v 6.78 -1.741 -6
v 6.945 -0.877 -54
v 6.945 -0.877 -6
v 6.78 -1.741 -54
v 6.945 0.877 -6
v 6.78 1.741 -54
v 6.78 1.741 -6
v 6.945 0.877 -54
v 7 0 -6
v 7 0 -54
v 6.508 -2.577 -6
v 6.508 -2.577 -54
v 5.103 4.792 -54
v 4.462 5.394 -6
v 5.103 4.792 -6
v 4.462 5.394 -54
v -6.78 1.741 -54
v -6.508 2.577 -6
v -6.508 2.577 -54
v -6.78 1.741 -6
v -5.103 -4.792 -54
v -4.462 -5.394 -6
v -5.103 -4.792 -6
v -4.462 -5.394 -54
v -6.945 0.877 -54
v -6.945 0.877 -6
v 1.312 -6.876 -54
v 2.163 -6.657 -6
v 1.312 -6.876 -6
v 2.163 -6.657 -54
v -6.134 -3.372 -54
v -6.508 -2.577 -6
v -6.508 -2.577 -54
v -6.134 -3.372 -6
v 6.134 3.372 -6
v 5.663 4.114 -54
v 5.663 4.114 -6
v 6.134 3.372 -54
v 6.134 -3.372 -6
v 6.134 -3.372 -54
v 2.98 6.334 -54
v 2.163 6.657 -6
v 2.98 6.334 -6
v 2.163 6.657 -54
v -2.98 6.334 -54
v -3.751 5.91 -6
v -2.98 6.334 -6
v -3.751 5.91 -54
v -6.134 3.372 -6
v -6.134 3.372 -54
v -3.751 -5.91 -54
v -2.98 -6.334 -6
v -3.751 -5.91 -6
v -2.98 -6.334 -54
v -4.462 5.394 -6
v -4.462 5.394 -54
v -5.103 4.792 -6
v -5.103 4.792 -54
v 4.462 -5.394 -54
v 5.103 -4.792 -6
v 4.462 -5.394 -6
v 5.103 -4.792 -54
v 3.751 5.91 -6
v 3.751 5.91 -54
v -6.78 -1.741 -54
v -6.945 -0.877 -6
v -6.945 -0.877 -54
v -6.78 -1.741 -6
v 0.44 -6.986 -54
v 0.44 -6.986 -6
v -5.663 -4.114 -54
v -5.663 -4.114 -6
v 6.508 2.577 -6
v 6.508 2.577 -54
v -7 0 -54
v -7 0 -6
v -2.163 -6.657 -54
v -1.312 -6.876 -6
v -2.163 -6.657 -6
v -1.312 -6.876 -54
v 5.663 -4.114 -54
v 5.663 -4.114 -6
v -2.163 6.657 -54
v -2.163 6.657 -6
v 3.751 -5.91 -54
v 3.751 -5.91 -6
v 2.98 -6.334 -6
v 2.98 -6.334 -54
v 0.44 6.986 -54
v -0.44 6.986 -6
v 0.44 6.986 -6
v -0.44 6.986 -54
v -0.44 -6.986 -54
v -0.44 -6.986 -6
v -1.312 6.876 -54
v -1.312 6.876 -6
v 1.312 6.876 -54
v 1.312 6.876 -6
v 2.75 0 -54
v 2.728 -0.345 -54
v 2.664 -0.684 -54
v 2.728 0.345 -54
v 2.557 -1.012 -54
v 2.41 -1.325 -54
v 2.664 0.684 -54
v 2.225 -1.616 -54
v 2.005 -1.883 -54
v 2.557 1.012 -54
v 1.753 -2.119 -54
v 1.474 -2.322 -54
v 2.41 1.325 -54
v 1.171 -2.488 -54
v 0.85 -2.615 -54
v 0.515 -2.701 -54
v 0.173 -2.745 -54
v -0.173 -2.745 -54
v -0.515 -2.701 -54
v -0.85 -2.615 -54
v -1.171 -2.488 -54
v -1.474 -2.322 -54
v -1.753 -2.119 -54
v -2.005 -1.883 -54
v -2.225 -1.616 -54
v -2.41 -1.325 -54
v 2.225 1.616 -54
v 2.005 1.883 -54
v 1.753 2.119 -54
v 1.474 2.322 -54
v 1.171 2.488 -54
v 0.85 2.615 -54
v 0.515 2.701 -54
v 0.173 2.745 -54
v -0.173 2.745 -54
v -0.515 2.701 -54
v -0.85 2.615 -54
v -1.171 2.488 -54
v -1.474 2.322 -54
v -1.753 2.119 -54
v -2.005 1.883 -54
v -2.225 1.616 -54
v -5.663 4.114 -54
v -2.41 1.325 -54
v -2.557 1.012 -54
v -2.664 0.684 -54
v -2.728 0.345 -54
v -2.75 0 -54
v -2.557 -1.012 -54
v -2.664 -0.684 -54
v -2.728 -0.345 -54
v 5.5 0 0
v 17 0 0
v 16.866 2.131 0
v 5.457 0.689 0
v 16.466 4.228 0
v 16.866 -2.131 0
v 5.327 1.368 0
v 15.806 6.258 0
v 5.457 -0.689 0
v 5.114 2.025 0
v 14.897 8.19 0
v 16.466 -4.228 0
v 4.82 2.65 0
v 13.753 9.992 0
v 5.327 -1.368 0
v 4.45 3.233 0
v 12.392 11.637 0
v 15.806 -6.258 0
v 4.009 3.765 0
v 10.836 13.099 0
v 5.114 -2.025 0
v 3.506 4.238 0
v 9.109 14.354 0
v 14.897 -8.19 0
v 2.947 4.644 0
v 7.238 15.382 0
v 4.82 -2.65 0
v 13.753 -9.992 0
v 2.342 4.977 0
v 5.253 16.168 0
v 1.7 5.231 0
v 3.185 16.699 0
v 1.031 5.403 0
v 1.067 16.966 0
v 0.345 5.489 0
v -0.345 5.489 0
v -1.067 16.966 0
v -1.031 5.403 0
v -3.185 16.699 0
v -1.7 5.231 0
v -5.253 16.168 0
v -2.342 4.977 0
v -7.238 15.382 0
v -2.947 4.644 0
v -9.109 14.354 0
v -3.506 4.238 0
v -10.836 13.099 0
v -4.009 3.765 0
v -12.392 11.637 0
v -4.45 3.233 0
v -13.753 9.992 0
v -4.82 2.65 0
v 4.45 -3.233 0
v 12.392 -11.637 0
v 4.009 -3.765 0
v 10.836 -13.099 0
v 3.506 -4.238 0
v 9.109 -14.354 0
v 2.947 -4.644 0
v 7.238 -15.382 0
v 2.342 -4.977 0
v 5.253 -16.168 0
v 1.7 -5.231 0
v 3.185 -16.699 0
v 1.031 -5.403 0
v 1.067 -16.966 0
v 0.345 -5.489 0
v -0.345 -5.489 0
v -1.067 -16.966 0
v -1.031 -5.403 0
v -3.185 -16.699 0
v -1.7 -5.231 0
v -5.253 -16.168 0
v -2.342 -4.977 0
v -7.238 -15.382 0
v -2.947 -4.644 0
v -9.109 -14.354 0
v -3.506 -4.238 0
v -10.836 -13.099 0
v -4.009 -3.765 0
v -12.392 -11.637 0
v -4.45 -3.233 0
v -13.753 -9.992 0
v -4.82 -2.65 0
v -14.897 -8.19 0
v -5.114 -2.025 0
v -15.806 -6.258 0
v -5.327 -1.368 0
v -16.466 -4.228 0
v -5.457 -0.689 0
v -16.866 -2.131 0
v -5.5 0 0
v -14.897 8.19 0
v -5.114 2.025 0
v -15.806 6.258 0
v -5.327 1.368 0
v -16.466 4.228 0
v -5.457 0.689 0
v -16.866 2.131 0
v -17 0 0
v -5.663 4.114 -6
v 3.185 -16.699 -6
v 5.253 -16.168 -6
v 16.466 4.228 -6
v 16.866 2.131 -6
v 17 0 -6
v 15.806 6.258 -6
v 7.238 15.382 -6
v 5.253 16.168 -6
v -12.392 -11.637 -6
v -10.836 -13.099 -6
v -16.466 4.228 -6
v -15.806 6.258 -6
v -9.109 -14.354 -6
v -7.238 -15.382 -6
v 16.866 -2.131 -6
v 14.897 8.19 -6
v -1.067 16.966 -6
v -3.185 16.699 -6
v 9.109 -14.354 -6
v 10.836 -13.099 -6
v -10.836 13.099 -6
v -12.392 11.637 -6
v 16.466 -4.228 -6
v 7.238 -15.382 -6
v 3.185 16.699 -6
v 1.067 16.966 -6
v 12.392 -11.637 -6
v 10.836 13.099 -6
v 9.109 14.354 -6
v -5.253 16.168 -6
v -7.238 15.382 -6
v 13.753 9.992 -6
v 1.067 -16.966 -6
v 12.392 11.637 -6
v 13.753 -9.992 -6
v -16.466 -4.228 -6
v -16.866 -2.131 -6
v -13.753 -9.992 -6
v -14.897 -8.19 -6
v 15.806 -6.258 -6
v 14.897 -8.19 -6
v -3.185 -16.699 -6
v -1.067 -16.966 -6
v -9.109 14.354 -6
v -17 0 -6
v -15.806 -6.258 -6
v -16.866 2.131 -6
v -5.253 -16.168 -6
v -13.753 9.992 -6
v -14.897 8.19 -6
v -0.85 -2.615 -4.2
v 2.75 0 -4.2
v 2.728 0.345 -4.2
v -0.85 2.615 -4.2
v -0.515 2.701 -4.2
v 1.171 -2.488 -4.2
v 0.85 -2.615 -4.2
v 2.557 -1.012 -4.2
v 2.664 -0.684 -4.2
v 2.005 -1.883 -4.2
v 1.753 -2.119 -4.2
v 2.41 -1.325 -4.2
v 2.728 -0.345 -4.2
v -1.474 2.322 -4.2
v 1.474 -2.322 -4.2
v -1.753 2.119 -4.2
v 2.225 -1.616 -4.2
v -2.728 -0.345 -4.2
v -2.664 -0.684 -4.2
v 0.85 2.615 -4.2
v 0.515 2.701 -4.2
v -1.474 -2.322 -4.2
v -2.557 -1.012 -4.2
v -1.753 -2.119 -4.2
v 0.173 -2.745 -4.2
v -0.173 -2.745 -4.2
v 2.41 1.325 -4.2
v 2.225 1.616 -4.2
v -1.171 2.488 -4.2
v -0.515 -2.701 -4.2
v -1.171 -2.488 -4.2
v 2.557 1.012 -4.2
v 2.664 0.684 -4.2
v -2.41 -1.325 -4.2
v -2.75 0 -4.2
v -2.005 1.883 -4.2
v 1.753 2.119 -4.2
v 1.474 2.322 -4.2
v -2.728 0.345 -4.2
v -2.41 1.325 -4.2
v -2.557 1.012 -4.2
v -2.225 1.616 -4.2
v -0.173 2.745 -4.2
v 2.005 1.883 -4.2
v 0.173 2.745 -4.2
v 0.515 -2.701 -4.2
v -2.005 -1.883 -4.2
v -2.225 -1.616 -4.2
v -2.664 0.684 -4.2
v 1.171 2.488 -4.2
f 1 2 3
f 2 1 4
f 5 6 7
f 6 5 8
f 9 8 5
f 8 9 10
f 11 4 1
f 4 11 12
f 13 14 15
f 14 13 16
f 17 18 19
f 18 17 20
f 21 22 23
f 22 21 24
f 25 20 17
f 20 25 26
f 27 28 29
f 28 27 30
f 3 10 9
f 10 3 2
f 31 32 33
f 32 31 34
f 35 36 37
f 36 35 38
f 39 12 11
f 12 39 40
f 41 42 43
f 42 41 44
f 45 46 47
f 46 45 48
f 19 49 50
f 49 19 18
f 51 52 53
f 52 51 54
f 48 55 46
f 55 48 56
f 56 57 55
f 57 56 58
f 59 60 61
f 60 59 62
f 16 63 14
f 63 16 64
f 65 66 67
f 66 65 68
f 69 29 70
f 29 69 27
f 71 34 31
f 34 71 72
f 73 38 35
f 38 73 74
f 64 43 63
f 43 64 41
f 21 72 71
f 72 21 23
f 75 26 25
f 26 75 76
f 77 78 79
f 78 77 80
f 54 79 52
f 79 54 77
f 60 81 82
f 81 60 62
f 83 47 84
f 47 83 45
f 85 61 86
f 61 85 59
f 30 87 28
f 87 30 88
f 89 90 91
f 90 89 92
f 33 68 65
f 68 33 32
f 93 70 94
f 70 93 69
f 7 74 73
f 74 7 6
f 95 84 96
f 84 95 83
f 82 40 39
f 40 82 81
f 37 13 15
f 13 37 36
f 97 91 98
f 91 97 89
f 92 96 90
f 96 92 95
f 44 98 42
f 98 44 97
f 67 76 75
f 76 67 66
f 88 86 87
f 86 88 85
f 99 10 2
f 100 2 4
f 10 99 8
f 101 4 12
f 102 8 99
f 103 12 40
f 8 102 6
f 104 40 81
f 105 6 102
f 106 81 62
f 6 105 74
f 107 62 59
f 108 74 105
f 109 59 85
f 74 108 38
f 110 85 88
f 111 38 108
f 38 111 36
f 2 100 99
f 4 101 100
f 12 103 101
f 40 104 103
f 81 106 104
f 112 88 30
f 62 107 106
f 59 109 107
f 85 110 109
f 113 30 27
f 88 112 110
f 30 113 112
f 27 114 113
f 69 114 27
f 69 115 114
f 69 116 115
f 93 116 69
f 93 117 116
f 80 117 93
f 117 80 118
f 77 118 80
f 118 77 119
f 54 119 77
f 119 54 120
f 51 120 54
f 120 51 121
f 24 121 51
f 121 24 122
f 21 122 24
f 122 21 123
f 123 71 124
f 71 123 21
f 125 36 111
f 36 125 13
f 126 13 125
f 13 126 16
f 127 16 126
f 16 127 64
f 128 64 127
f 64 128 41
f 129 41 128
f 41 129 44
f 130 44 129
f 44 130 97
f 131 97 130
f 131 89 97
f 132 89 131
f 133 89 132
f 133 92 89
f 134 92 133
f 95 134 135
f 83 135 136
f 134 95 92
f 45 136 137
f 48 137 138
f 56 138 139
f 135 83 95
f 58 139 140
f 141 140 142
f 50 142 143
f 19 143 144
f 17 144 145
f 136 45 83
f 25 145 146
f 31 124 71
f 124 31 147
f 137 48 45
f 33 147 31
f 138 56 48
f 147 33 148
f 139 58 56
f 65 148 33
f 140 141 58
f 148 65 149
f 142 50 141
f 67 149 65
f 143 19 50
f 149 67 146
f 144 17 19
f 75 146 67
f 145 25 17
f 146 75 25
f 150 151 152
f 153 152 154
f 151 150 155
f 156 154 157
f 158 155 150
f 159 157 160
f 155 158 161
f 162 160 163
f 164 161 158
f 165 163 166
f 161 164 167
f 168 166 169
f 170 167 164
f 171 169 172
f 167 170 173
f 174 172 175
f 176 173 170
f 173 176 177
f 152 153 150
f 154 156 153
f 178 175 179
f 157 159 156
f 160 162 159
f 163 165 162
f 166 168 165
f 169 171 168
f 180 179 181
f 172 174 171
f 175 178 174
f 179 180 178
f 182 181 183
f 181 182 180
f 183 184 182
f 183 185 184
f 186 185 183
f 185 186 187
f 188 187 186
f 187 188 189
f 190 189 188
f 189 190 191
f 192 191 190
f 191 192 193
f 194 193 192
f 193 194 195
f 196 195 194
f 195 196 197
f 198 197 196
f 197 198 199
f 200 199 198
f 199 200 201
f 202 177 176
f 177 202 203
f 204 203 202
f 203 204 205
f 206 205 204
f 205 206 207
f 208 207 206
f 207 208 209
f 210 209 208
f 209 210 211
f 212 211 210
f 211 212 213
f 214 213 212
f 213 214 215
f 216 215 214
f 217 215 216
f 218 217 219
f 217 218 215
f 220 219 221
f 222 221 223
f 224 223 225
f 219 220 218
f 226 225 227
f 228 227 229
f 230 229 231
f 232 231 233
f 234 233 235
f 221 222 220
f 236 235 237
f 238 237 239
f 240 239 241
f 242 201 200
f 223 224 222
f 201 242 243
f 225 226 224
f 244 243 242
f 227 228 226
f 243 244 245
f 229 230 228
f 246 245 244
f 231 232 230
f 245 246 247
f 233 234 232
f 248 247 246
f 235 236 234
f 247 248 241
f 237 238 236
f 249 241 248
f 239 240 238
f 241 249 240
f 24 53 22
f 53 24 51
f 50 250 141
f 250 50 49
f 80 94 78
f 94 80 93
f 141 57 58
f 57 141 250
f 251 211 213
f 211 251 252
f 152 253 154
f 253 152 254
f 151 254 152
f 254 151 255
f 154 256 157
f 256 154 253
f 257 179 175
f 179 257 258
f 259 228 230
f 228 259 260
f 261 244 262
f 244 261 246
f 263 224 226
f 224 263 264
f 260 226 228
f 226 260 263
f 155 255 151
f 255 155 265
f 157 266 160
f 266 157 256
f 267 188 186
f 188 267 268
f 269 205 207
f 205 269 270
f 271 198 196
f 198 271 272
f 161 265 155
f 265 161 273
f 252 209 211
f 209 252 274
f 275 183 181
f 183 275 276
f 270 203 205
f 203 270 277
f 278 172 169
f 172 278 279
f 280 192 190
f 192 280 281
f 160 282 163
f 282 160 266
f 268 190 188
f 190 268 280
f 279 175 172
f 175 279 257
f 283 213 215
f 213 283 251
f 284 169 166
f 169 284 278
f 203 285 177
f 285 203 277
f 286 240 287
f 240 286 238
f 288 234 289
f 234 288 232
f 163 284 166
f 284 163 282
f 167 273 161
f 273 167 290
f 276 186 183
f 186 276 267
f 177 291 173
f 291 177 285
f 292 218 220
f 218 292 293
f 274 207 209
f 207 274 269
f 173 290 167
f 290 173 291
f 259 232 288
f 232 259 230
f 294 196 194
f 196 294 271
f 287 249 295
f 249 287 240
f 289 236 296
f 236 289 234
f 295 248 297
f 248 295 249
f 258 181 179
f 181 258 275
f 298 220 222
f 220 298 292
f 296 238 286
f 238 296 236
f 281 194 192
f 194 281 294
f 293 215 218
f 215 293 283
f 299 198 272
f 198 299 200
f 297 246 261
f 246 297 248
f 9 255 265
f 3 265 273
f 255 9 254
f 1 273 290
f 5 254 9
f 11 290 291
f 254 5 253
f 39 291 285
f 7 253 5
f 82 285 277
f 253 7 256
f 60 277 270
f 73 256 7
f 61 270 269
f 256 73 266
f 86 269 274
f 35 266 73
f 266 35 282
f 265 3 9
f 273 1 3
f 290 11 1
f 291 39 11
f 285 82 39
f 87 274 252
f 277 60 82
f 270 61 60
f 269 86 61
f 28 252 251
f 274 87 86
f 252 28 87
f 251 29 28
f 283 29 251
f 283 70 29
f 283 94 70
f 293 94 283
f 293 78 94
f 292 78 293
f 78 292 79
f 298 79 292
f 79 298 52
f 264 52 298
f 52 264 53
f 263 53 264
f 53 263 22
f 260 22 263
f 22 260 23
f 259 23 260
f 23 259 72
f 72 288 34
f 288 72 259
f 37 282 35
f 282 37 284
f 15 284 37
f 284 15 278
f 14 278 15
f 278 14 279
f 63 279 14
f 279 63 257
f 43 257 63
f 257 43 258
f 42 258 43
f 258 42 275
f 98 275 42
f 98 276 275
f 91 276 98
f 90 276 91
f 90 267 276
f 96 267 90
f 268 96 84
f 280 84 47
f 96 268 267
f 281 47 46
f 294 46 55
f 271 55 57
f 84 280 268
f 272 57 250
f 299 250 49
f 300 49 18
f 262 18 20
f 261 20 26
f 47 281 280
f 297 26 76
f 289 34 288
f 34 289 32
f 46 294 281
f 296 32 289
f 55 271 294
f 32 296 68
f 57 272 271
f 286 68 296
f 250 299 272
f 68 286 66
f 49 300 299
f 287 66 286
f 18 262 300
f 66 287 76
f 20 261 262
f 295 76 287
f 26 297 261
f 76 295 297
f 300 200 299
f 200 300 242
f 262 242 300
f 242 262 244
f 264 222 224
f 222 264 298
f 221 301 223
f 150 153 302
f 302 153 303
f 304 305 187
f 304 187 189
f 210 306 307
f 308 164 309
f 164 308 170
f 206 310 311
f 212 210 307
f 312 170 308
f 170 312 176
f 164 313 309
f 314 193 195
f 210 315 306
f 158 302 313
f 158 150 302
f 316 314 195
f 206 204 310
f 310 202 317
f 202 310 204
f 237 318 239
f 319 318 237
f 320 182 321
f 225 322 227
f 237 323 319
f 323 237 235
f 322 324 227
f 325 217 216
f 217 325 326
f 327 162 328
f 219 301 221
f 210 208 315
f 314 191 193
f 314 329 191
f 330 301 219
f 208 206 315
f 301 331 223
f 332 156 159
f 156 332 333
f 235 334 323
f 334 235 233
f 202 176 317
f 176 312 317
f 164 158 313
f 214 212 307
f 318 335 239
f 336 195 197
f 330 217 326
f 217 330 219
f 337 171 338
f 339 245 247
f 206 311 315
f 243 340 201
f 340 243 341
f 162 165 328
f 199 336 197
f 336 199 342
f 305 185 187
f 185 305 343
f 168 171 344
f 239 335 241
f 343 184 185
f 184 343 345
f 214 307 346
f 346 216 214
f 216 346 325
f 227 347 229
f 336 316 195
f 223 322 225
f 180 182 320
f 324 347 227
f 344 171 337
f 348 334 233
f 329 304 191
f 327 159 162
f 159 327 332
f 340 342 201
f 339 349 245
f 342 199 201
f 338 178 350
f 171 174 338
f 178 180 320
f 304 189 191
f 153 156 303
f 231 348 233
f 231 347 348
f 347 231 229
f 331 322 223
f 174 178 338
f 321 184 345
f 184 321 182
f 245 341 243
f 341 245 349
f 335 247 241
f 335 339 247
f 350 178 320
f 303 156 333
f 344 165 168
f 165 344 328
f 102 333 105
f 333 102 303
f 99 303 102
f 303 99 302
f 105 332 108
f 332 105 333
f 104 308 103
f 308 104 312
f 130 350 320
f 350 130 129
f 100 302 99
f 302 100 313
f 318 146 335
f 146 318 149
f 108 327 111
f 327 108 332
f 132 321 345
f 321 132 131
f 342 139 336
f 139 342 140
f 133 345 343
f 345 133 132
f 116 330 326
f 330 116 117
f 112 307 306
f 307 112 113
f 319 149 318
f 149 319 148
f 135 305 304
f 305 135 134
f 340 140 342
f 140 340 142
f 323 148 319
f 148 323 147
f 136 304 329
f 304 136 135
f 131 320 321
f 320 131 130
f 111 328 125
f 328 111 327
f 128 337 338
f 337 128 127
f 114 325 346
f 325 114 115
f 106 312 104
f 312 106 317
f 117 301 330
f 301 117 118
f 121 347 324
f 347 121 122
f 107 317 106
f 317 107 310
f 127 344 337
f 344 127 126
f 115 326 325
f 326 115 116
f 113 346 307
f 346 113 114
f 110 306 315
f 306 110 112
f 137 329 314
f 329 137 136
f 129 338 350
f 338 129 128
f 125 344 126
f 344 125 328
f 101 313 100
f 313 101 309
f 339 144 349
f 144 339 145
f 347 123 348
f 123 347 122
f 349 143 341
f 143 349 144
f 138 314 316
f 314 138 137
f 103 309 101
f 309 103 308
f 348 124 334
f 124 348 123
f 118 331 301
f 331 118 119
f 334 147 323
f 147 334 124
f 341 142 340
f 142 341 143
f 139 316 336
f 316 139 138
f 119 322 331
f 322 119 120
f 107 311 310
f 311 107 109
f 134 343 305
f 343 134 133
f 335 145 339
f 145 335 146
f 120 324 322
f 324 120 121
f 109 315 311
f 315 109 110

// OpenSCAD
$fn = 50;


difference() {
	union() {
		translate(v = [0, 0, -54.0000000000]) {
			cylinder(h = 54, r = 7.0000000000);
		}
		translate(v = [0, 0, -6.0000000000]) {
			cylinder(h = 6, r = 17.0000000000);
		}
	}
	union() {
		translate(v = [0, 0, 0]) {
			rotate(a = [0, 0, 0]) {
				difference() {
					union() {
						#translate(v = [0, 0, -54.0000000000]) {
							cylinder(h = 54, r = 2.2500000000);
						}
						#translate(v = [0, 0, -4.2000000000]) {
							cylinder(h = 4.2000000000, r = 7.0000000000, r1 = 2.7500000000, r2 = 5.5000000000);
						}
						#translate(v = [0, 0, -54.0000000000]) {
							cylinder(h = 54, r = 2.7500000000);
						}
						#translate(v = [0, 0, -54.0000000000]) {
							cylinder(h = 54, r = 2.2500000000);
						}
					}
					union();
				}
			}
		}
	}
}
